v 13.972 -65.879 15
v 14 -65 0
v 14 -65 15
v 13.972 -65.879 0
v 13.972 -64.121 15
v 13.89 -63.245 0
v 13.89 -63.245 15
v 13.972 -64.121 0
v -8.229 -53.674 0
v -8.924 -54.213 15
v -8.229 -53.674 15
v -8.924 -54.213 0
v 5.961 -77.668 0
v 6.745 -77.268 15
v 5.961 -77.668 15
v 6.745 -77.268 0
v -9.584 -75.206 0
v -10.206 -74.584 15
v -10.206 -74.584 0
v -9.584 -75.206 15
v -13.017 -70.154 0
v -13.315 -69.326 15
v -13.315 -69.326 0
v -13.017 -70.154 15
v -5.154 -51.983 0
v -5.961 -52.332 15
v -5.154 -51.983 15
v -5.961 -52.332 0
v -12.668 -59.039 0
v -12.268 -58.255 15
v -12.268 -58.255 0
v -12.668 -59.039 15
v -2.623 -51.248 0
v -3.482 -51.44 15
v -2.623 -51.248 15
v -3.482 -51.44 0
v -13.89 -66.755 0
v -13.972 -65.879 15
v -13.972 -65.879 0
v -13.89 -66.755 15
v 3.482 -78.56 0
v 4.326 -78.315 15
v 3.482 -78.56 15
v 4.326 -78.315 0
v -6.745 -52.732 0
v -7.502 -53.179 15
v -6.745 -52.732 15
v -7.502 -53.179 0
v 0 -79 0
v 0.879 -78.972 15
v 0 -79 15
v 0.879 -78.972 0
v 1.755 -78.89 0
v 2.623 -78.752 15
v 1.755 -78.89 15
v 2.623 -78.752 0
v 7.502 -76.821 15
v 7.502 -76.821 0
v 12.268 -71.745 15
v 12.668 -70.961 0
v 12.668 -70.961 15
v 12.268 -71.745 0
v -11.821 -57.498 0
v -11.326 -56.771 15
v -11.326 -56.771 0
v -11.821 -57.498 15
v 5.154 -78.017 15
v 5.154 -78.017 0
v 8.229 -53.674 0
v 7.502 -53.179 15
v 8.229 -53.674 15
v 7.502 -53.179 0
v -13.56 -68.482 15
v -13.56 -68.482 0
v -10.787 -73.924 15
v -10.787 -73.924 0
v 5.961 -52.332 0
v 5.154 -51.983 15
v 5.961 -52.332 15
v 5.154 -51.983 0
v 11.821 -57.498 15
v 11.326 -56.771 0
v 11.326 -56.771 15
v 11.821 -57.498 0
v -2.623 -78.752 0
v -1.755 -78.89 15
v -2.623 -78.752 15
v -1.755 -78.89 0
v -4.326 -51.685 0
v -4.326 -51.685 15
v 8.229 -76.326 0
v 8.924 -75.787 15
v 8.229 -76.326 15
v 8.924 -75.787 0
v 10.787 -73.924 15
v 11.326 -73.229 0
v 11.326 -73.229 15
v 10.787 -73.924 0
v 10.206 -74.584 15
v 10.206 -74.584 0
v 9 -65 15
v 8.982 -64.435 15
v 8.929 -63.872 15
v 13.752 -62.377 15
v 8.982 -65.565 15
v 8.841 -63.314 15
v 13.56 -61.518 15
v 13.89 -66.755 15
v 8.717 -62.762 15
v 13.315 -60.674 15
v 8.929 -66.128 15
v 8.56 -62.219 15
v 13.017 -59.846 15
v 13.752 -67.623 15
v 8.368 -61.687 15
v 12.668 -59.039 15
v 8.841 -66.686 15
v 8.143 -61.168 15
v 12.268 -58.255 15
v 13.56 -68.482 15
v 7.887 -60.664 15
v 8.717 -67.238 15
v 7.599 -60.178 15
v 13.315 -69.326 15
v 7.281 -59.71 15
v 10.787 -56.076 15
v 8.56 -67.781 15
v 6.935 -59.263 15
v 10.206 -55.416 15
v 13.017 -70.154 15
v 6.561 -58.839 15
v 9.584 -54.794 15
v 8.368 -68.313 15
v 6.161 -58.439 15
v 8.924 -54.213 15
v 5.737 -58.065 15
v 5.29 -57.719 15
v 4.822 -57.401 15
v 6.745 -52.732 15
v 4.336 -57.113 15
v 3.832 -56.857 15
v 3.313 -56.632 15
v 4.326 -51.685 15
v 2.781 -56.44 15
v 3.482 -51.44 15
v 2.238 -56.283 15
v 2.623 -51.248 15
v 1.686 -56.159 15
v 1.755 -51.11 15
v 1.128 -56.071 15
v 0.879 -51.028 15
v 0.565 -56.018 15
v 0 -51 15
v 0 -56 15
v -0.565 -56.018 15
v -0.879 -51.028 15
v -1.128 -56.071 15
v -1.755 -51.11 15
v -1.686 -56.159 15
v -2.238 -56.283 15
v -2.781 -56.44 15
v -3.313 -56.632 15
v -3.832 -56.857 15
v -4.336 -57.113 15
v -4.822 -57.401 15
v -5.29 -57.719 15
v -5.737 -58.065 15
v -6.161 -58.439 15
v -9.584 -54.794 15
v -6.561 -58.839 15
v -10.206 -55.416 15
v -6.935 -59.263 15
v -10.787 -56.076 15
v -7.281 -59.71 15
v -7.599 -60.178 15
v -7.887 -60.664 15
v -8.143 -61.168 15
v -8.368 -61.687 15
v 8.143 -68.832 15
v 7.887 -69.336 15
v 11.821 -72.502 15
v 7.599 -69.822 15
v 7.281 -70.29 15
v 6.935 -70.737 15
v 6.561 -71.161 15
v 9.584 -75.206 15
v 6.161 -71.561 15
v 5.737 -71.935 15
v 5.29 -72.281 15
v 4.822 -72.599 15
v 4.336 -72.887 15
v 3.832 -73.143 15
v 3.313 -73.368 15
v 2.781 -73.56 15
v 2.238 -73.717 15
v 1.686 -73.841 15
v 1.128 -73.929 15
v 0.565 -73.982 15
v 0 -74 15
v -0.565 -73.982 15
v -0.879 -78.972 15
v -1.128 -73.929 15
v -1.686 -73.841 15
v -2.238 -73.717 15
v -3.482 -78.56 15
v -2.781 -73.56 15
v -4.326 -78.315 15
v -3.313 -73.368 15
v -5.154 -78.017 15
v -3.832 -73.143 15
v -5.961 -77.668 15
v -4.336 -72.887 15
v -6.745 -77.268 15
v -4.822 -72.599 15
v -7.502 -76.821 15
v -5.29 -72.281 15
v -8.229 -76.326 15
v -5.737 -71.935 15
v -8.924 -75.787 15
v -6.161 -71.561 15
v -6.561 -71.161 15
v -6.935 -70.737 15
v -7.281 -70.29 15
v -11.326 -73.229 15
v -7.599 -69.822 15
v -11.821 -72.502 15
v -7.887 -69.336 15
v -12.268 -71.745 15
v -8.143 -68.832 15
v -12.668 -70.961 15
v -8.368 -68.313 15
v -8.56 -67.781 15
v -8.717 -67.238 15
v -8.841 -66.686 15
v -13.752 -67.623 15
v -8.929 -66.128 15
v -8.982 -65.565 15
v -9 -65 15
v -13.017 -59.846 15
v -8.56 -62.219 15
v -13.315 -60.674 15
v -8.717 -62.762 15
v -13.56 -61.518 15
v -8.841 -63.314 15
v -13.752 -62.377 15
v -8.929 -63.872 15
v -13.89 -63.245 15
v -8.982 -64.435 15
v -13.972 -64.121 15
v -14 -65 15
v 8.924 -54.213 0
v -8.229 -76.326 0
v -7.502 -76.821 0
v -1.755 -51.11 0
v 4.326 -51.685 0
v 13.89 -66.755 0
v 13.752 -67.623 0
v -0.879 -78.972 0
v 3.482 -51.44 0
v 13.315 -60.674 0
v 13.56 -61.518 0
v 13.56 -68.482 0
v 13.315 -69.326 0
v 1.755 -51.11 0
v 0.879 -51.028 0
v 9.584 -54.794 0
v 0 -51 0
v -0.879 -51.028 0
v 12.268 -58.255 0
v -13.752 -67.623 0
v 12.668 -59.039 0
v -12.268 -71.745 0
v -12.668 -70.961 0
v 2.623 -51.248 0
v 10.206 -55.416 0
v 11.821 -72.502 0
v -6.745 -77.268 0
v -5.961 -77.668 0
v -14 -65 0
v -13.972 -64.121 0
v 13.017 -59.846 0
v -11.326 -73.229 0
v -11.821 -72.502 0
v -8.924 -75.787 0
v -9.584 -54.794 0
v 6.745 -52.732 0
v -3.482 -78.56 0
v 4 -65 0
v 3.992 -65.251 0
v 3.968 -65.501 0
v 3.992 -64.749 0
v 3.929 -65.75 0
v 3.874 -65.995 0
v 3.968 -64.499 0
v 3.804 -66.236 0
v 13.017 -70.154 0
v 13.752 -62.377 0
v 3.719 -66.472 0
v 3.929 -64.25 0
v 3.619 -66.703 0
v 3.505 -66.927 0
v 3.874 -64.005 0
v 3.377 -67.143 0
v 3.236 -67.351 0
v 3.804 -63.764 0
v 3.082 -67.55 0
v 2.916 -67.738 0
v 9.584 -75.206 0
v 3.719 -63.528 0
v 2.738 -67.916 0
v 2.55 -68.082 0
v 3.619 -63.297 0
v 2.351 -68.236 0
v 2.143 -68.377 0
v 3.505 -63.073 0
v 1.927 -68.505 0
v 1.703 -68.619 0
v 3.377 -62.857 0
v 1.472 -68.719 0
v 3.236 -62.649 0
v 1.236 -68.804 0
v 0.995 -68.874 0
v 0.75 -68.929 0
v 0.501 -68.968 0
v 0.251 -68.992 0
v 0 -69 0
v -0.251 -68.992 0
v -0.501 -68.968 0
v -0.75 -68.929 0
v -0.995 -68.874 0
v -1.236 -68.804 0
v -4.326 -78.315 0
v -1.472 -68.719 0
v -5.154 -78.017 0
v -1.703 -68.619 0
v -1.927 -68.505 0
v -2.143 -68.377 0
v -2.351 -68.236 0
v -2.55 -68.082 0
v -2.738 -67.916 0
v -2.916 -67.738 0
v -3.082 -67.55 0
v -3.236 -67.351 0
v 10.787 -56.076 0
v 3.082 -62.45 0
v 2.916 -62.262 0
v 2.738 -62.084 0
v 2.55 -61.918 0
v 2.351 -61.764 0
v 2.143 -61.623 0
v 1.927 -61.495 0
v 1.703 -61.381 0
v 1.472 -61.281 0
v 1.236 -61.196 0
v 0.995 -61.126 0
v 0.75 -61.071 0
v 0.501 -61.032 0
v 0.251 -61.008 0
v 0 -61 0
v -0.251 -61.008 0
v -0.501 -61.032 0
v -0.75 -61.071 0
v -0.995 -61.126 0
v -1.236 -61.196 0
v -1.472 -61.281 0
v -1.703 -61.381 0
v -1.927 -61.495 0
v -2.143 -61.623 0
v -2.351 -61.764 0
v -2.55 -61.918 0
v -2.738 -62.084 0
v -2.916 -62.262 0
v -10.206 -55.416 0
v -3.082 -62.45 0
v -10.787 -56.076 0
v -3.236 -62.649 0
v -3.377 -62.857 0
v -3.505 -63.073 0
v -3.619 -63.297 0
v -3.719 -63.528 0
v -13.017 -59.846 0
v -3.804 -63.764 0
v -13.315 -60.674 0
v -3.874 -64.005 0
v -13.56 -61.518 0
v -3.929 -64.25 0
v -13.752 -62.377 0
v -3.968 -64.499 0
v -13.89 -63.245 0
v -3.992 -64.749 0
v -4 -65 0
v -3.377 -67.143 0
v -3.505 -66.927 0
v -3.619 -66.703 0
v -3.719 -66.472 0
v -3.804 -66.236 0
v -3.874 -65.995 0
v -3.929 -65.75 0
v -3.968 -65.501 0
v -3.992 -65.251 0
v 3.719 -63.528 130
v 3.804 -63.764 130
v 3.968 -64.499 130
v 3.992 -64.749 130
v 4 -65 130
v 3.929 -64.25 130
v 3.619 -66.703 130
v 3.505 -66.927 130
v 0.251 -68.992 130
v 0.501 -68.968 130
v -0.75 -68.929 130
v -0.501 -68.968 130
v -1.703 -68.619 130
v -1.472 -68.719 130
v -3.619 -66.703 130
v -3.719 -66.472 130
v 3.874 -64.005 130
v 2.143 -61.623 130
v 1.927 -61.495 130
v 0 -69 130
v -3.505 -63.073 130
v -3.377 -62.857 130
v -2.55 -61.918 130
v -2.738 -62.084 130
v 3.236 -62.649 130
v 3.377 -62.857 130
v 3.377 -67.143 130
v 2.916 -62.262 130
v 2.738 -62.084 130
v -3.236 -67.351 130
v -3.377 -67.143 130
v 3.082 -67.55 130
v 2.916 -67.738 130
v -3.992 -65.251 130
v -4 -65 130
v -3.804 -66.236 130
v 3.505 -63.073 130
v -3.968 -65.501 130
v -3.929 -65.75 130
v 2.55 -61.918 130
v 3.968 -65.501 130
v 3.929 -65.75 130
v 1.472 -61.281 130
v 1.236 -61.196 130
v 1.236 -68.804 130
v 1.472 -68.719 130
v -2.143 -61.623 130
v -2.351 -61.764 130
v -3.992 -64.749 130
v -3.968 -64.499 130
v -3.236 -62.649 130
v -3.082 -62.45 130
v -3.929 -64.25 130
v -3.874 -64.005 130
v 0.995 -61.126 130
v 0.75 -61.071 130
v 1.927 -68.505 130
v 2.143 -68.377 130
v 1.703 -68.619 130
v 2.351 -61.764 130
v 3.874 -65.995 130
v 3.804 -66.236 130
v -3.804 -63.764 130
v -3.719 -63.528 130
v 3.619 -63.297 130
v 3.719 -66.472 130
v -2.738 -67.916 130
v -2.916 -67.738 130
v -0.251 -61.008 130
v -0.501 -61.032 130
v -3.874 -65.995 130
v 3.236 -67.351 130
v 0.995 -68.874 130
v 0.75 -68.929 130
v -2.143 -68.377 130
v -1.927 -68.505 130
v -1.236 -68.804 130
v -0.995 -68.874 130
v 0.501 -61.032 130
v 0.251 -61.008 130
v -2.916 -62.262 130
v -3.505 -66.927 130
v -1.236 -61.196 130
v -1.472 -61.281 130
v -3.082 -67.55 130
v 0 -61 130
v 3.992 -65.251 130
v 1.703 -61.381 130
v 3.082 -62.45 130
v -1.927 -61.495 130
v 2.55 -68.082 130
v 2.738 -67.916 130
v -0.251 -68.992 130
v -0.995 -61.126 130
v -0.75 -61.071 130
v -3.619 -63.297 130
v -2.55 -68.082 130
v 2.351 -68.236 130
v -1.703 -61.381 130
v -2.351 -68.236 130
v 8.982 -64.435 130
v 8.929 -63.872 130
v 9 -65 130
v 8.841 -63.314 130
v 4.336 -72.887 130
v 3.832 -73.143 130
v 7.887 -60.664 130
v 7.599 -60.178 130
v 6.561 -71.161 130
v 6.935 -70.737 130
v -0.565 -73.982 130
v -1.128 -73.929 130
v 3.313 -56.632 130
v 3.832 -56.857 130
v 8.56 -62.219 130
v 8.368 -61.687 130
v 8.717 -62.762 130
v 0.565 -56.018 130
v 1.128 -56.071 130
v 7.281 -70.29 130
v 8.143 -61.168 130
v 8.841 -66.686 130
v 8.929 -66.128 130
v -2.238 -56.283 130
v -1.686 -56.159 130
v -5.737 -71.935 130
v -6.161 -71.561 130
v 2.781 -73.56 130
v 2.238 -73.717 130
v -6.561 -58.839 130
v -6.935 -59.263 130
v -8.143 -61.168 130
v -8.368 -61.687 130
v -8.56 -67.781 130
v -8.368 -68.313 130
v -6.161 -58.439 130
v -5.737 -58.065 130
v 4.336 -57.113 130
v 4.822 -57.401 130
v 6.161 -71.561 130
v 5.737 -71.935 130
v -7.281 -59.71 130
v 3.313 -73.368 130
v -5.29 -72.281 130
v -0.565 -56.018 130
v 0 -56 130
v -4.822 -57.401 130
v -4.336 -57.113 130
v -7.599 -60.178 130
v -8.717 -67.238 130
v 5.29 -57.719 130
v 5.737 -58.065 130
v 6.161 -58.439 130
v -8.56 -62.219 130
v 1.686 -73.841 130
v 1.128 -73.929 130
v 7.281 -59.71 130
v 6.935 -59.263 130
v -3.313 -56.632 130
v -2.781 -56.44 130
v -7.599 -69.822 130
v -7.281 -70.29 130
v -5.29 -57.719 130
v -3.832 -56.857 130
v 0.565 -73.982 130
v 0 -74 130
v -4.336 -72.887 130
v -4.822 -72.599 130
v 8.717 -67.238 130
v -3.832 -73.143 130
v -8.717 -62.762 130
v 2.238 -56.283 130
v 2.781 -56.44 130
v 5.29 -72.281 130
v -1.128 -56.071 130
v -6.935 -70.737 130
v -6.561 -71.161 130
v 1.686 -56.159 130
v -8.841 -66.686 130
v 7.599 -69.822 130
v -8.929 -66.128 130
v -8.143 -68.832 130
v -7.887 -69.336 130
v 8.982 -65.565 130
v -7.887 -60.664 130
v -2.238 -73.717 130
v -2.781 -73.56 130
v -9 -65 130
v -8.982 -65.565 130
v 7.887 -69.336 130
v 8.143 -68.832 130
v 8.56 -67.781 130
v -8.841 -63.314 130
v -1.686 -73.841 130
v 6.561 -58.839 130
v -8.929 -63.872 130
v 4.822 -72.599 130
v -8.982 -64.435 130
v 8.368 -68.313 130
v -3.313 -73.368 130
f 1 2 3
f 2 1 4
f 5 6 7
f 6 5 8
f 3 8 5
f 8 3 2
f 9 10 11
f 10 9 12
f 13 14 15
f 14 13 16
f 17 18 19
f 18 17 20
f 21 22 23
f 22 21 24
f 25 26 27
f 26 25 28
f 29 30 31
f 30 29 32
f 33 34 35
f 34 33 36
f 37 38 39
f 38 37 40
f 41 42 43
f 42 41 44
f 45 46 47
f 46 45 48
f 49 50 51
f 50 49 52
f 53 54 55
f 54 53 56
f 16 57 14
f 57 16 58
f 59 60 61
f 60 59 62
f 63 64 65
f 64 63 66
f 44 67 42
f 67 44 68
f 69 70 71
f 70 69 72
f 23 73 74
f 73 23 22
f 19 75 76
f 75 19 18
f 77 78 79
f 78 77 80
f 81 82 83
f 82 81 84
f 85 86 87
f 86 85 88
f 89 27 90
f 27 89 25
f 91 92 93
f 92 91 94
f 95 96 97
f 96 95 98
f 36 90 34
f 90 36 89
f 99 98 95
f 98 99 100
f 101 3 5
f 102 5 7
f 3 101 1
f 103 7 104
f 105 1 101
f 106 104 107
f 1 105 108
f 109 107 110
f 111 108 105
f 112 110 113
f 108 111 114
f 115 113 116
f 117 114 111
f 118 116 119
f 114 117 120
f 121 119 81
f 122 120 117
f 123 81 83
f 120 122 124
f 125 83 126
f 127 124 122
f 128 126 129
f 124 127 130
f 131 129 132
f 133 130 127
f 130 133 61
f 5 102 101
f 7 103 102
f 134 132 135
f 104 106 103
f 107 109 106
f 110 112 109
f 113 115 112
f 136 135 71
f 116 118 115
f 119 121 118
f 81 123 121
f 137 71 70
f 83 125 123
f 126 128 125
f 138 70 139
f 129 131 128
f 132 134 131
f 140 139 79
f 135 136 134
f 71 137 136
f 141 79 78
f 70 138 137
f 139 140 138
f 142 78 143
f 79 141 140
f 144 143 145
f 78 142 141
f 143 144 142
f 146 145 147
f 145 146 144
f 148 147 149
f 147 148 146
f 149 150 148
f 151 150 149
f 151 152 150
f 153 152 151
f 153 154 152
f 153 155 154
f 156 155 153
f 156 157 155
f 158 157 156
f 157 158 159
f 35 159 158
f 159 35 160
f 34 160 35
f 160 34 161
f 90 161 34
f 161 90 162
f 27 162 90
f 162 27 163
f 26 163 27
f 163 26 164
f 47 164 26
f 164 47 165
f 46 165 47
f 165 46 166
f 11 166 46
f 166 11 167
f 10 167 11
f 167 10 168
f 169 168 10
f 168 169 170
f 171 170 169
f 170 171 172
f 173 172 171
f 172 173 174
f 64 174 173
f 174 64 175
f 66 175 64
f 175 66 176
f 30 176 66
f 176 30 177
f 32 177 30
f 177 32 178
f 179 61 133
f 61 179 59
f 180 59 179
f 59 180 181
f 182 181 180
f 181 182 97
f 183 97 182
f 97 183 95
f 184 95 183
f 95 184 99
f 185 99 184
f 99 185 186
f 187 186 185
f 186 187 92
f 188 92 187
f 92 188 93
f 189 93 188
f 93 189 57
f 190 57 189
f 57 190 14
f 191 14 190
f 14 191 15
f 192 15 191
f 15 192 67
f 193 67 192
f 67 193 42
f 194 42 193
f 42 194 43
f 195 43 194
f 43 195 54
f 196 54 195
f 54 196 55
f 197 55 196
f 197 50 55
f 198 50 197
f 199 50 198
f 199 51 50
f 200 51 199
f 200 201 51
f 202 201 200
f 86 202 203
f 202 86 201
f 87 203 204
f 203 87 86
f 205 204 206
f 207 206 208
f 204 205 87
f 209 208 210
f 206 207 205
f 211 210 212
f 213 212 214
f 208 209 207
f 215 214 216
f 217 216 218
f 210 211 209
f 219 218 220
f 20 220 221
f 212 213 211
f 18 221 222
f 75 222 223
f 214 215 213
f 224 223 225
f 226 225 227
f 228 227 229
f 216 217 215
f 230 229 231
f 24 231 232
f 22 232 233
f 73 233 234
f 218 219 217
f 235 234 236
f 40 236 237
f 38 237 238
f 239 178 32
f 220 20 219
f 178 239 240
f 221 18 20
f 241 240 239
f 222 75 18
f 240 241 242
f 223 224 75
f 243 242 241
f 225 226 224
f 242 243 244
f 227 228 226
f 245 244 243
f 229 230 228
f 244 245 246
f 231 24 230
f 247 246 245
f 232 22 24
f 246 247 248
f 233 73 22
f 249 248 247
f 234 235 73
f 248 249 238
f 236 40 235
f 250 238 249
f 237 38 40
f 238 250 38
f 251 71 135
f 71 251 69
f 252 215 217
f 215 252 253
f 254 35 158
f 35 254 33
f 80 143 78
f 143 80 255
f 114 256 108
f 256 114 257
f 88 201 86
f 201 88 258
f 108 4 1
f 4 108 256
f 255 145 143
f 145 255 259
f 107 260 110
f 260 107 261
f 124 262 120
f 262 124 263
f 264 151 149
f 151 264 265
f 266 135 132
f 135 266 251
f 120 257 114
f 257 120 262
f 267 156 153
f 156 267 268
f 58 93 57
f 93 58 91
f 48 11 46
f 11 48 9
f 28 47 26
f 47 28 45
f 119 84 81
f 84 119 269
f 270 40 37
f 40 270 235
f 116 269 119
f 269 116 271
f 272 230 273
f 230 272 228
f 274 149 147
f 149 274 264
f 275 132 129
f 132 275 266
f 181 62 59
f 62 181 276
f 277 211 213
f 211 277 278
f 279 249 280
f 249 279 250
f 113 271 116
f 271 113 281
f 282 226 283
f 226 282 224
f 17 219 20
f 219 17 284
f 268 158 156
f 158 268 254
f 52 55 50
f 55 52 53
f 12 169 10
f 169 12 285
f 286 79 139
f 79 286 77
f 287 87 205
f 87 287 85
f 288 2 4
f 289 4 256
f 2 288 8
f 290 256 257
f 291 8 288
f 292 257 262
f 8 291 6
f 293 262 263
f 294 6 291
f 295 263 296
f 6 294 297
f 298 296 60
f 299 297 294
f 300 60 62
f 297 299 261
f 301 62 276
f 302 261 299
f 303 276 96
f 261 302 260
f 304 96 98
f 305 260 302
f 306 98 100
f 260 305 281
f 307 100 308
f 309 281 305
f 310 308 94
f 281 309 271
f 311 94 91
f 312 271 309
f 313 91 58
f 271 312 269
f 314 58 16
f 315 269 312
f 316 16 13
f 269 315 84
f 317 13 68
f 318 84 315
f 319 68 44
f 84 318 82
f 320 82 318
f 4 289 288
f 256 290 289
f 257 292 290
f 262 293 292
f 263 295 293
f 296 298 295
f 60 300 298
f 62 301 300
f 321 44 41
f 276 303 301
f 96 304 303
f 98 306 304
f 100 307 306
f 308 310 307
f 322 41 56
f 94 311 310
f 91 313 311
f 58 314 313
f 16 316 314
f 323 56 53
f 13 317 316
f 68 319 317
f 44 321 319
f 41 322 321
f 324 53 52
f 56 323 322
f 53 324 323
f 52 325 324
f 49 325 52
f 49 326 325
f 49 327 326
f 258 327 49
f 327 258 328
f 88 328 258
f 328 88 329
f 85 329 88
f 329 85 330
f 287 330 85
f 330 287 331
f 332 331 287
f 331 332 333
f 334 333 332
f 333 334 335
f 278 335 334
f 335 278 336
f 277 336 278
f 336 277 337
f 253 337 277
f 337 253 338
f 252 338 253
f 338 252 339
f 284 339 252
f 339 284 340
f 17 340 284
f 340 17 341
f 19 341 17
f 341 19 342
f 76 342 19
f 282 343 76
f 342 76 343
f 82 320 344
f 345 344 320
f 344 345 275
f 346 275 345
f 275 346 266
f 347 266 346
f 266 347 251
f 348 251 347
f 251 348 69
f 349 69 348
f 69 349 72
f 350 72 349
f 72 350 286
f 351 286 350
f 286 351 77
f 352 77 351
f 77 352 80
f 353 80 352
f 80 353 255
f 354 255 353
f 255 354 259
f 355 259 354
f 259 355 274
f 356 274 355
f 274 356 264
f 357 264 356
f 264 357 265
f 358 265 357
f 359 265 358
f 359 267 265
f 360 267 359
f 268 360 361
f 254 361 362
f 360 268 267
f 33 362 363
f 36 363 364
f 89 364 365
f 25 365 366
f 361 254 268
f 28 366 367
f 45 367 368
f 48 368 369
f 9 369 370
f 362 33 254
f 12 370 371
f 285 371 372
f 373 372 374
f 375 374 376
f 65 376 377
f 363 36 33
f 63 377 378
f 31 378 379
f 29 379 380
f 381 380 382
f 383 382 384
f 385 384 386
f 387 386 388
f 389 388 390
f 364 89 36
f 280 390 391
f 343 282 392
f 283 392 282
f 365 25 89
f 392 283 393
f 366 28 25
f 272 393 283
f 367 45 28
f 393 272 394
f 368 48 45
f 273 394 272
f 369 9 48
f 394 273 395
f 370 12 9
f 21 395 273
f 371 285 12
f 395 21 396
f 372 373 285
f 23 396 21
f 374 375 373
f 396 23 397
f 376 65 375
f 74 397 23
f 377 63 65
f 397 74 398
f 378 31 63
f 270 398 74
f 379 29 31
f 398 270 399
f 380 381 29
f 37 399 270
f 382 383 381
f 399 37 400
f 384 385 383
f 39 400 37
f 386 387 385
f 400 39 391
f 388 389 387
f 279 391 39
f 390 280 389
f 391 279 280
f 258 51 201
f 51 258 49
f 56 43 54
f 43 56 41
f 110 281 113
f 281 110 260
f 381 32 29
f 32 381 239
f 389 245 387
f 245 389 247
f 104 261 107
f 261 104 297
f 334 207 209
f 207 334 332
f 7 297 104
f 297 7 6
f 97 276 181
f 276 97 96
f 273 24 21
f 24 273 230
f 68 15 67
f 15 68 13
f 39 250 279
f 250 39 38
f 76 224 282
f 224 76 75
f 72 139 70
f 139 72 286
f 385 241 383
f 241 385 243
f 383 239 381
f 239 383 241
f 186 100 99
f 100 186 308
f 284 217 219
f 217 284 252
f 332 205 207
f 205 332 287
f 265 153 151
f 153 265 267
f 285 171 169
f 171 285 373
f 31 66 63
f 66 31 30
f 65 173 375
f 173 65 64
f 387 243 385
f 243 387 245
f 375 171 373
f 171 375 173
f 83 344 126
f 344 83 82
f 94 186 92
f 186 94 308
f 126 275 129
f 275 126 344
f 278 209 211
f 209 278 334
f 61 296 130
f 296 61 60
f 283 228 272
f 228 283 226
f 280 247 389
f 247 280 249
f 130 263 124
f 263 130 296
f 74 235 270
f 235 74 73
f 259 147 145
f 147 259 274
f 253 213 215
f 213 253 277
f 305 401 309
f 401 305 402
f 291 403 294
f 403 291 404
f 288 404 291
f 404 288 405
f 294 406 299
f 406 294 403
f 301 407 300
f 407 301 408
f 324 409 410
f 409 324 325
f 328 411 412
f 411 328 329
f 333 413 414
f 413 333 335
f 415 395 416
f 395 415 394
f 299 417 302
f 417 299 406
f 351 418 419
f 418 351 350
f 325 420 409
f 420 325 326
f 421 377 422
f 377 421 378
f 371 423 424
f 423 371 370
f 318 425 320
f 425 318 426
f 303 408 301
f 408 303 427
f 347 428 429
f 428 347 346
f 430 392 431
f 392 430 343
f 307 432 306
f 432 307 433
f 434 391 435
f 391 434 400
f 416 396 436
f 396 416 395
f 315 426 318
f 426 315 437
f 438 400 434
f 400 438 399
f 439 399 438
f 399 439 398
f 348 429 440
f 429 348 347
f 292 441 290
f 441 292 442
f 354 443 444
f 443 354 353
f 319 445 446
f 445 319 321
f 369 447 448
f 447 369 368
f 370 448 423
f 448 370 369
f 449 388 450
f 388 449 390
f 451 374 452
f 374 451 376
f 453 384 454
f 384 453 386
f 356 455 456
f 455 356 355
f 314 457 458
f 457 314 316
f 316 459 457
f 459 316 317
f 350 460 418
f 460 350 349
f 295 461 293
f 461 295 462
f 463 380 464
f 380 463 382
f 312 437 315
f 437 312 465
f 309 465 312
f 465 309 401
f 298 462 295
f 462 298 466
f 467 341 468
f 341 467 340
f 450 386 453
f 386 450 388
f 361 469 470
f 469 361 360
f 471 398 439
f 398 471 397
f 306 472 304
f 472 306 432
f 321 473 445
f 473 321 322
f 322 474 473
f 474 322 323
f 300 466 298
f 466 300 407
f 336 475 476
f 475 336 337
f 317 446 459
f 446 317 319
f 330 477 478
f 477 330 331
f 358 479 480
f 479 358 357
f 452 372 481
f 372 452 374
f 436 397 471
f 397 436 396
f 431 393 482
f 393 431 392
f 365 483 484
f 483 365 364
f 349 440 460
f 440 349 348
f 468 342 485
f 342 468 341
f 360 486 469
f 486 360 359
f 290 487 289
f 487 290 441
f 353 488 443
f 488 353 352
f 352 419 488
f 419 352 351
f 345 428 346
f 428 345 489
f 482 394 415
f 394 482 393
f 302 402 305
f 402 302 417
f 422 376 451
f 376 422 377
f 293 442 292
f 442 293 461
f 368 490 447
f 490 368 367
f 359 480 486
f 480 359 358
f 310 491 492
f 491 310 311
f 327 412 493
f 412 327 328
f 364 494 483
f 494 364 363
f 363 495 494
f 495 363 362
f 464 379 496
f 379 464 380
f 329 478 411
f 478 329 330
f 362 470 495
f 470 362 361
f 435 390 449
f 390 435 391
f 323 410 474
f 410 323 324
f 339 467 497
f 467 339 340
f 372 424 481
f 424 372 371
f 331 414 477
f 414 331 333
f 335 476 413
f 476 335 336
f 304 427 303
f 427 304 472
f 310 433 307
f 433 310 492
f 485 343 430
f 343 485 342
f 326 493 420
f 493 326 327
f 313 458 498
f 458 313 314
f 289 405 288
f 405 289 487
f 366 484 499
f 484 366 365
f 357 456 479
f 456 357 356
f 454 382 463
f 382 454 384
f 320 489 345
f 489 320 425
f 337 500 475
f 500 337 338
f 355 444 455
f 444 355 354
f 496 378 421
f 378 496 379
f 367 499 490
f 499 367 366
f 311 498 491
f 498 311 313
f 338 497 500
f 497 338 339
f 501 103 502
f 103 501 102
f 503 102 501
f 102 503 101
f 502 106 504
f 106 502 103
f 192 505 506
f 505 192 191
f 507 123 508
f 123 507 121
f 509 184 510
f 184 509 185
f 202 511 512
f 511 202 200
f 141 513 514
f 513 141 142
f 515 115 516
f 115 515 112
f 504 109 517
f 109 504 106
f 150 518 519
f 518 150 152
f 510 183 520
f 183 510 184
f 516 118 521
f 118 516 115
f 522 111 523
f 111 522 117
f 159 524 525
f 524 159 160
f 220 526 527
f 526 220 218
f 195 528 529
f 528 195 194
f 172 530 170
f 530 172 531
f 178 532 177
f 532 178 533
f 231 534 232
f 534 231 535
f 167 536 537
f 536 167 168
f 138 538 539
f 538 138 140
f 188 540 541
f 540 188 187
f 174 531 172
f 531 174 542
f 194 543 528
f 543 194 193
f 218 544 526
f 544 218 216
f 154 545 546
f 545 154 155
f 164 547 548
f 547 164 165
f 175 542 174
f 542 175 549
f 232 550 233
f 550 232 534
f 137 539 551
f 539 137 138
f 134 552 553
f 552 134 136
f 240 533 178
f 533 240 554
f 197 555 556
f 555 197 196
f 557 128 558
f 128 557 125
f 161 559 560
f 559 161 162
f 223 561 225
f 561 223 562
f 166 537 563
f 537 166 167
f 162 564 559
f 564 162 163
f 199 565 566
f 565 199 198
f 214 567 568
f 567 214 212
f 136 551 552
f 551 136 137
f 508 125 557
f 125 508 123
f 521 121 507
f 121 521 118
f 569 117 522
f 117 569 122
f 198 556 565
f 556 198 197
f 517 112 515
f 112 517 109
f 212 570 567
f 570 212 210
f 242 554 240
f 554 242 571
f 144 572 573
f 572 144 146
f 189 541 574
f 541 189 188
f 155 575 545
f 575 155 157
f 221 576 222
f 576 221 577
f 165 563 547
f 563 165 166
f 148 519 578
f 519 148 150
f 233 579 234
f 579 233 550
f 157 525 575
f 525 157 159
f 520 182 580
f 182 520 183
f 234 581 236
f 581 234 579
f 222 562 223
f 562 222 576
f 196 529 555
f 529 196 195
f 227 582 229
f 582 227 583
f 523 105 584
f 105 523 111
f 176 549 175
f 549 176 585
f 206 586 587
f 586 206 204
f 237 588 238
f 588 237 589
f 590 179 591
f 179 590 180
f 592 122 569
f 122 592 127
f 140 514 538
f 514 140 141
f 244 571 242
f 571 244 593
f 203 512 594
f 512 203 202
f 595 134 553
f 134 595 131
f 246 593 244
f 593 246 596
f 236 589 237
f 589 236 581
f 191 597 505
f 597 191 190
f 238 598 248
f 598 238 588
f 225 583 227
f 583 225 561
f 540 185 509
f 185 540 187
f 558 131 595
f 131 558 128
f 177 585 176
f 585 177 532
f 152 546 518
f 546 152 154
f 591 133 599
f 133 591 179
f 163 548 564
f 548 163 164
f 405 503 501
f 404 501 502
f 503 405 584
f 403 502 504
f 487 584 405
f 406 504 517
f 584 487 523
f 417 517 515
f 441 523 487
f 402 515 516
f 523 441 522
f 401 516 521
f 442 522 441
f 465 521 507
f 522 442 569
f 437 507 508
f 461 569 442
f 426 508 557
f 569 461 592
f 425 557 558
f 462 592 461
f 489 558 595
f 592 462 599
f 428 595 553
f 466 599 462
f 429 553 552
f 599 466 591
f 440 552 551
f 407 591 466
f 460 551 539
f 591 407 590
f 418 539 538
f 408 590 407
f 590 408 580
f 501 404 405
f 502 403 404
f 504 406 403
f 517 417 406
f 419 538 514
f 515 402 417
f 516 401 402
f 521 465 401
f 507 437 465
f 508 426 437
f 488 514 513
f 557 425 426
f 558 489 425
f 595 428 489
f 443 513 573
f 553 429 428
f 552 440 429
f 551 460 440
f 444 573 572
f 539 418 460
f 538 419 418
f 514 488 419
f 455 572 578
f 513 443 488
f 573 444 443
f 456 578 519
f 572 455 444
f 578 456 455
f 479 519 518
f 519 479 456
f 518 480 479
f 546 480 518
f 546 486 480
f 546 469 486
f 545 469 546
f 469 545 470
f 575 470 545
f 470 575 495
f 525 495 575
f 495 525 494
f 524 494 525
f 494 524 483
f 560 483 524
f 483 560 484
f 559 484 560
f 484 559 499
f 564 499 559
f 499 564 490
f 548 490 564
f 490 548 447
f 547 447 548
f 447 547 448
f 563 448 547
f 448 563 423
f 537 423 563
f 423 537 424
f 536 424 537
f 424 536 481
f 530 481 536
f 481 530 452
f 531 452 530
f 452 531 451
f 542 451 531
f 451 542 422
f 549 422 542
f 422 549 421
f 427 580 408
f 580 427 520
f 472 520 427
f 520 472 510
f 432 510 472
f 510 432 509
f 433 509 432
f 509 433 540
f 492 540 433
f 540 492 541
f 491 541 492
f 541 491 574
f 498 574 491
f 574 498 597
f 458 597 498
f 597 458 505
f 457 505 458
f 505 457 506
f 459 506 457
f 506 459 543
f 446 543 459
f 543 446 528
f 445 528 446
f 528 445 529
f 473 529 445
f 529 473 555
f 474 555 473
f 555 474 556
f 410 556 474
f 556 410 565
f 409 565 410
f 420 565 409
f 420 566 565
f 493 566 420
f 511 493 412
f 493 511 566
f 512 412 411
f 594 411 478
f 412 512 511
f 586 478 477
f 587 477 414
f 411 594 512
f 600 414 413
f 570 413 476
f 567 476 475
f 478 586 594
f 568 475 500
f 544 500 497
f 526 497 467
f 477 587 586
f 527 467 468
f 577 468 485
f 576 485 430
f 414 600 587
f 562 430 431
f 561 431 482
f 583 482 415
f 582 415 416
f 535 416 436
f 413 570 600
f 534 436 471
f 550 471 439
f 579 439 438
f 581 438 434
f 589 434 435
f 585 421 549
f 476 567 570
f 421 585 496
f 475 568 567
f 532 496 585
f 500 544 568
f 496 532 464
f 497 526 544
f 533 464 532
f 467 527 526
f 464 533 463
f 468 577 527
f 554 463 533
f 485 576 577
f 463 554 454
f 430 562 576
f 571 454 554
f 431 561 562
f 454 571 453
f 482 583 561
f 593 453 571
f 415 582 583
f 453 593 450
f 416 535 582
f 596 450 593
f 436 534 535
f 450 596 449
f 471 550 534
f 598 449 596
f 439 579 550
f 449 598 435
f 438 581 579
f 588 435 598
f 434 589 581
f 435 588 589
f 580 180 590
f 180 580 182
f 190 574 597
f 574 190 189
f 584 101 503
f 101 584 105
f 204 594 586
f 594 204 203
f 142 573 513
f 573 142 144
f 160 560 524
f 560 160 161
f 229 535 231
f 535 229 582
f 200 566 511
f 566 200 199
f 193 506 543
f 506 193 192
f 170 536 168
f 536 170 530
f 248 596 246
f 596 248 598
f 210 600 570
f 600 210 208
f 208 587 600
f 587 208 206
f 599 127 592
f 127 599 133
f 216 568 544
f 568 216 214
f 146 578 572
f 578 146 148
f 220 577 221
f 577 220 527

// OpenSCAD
// file: library.scad
function sq(x) = x * x;

module ogive_nose_cone(radius, height, slices = 10, thickness = -1) {   //create ogive nose cone with rounded top tip
    
    rounding_level = height -  thickness/2;

    ogive_radius = (height * height + radius * radius) / (2 * radius);
    
    center_x = -ogive_radius + radius;
    center_y = 0;
    
    d = height / slices;
    rounding_sphere_radius = thickness/3;
    rounding_radius = w(rounding_level, ogive_radius); // radius of cone at rounding level

    rounding_sphere_height = rounding_sphere_radius - sqrt(sq(rounding_sphere_radius) - sq(rounding_radius));
    
    echo("rounding_sphere_height=", rounding_sphere_height);
    
    function w(y, r) = center_x + sqrt(
        (r * r) - (y * y)
    );
    
    
    difference () {
        rotate_extrude ($fn = slices)
        difference () {
            polygon(
                points = concat([
                    [0, height],
                    [0, 0],
                    [radius, 0]
                ],
                [ for (i = [0 : (slices - 1)]) [w(i * d, ogive_radius), i * d] ]),
                paths = [ [ for (i = [0 : (slices + 2)]) i ] ]
            );
            
            if (thickness > 0) {
                polygon(
                    points = concat([
                        [0, sqrt(sq(ogive_radius - thickness) - sq(ogive_radius - radius))],
                        [0, 0],
                        [radius - thickness, 0]
                    ],
                    [ for (i = [0 : (slices - 1)]) [w(i * d, ogive_radius - thickness), i * d] ]),
                    paths = [ [ for (i = [0 : (slices + 2)]) i ] ]
                );
            }
        }
        
        translate([0, 0 , rounding_level])      // top rounding to make the cone printable. 
        cylinder(r = radius, h = height);
    }
    translate([0, 0 , rounding_level])
    intersection() {
        cylinder(r=radius, h=height);
        translate([0, 0 , - rounding_sphere_radius + rounding_sphere_height ])
        sphere(rounding_sphere_radius, $fn=slices);
    }
}


module ring(radius, width, height) {
	difference () {
		cylinder(r = radius, h = height);
		translate([0, 0, -1])
		cylinder(r = radius - width, h = height + 2);
	}
}


module ccube(width, depth, height, z_center = false) {
	if (z_center) {
		translate([-width / 2, -depth / 2, -height / 2])
		cube([width, depth, height]);
	} else {
		translate([-width / 2, -depth / 2, 0])
		cube([width, depth, height]);
	}
}

module twisted_ribs(outer_r, inner_r, height, twist, count, wall) {
	angle = 360 / count;
	linear_extrude(height, twist = twist, slices = 20) {
		for (i = [0 : (count - 1)]) {
			rotate([0, 0, i * angle])
			translate([0, inner_r])
			square([wall, wall]);
		}
	}
}

/*
ccube(100, 100, 10);
ring(50, 5, 20);
ring(50, 2, 30);
*/

module screw_anchor(outer_r, inner_r, depth, height, wall) {
	rotate([30, 0, 0])
	difference () {
		//translate([-outer_r / 2 - wall, outer_r / 2, 0])
		translate([-outer_r - wall, -wall, 0])
		cube([(outer_r + wall) * 2, depth, height]);

		//ccube(outer_r + wall * 2, outer_r + wall * 2, height);
		translate([0, outer_r, 0]) {
		cylinder(r = outer_r, h = height / 2);
		cylinder(r = inner_r, h = height);
		
		translate([-outer_r, 0, 0])
		cube([outer_r * 2, depth, height / 2]);
		}
	}
}

module tube(wall_thickness, radius, lenght) {
    difference() {
        cylinder(r = radius + wall_thickness, h = lenght);
        translate([0, 0, -0.05]) cylinder(r = radius, h = lenght + 0.1);
    }
}

module tube_twists_in(wall_thickness, radius, lenght, teeth_twist, teeth_count, teeth_size) {
    difference () {
        twisted_ribs(radius, radius - teeth_size, lenght, teeth_twist, teeth_count, teeth_size);						
        cylinder(r1 = radius - lenght, r2 = radius - wall_thickness, h = lenght);
    }
    tube(wall_thickness, radius, lenght);
    
}

module nozzle_die(wall_thickness, radius, nozzle_lenght, r_throat, r_outcome) {
difference () {
    union () {
        cylinder(r = radius + wall_thickness + 2, h = wall_thickness);    
        translate([0, 0, wall_thickness]) cylinder(r = radius, h = 2.5);
        translate([0, 0, wall_thickness + 2.5])cylinder(r1 = radius, r2 = r_outcome, h = nozzle_lenght / 2);
        translate([0, 0, wall_thickness + nozzle_lenght / 2 + 2.5])cylinder(r1 = r_outcome, r2 = r_throat, h = nozzle_lenght);
    }
    cylinder(r = r_throat, h = 3*nozzle_lenght);
}
}

module concentric_cylinders(r, l, thickness, cylinders, spacing) {
    for(i = [0 : cylinders - 1]) {
        tube(thickness, i * (spacing + thickness) + r, l);
    }
}

module pcb_mount(r, lenght, wall_thickness, pcb_thickness) {
    union() {
        translate([-r, -(wall_thickness * 2 + pcb_thickness) / 2, 0]) union() {
            cube([wall_thickness * 2 + 4, wall_thickness * 2 + pcb_thickness, wall_thickness]);
            cube([wall_thickness, pcb_thickness + wall_thickness * 2, lenght + wall_thickness]);
            cube([wall_thickness * 2 + 4, wall_thickness, lenght + wall_thickness]);
            translate([0, pcb_thickness + wall_thickness, 0]) cube([wall_thickness * 2 + 4, wall_thickness, lenght + wall_thickness]);
    }
    
        translate([r, (wall_thickness * 2 + pcb_thickness) / 2, ]) rotate([0, 0, 180])  union() {
            cube([wall_thickness * 2 + 4, wall_thickness * 2 + pcb_thickness, wall_thickness]);
            cube([wall_thickness, pcb_thickness + wall_thickness * 2, lenght + wall_thickness]);
            cube([wall_thickness * 2 + 4, wall_thickness, lenght + wall_thickness]);
            translate([0, pcb_thickness + wall_thickness, 0]) cube([wall_thickness * 2 + 4, wall_thickness, lenght + wall_thickness]);
        }
    }
}
// main file
THICKNESS = 1.1;
RADIUS = 15;
LENGHT = 120;
NOZZLE_THROAT_RADIUS = 2;
NOZZLE_OUTCOME_RADIUS = 7;
NOZZLE_LENGHT = 7;
TOLERANCE = 0.5;
$fn = 100;

use <library.scad>


/*color([0, 0, 1]) translate([0, RADIUS + 50, 0]) nozzle_die(THICKNESS, RADIUS - TOLERANCE, NOZZLE_LENGHT, NOZZLE_THROAT_RADIUS, NOZZLE_OUTCOME_RADIUS);
*/

/*
color([0, 1, 0]) union() {
    tube(THICKNESS, RADIUS, LENGHT);
}
*/


//engine fuel 
color([1, 0, 0]) translate([0, -RADIUS - 50, 0]) tube(RADIUS - NOZZLE_THROAT_RADIUS - TOLERANCE * 6, NOZZLE_THROAT_RADIUS + TOLERANCE * 4, 15);
    translate([0, -RADIUS - 50, 10])
        tube((RADIUS - NOZZLE_THROAT_RADIUS - TOLERANCE * 6) / 2, NOZZLE_THROAT_RADIUS + TOLERANCE * 4, LENGHT);

// engine cup 

/*color([1, 1, 0]) translate([RADIUS + 50, 0, 0]) 
union() {
    cylinder(r = RADIUS + THICKNESS, h = 5);
    translate([0, 0, 5]) cylinder(r = RADIUS - TOLERANCE, h = 10);
}*/
